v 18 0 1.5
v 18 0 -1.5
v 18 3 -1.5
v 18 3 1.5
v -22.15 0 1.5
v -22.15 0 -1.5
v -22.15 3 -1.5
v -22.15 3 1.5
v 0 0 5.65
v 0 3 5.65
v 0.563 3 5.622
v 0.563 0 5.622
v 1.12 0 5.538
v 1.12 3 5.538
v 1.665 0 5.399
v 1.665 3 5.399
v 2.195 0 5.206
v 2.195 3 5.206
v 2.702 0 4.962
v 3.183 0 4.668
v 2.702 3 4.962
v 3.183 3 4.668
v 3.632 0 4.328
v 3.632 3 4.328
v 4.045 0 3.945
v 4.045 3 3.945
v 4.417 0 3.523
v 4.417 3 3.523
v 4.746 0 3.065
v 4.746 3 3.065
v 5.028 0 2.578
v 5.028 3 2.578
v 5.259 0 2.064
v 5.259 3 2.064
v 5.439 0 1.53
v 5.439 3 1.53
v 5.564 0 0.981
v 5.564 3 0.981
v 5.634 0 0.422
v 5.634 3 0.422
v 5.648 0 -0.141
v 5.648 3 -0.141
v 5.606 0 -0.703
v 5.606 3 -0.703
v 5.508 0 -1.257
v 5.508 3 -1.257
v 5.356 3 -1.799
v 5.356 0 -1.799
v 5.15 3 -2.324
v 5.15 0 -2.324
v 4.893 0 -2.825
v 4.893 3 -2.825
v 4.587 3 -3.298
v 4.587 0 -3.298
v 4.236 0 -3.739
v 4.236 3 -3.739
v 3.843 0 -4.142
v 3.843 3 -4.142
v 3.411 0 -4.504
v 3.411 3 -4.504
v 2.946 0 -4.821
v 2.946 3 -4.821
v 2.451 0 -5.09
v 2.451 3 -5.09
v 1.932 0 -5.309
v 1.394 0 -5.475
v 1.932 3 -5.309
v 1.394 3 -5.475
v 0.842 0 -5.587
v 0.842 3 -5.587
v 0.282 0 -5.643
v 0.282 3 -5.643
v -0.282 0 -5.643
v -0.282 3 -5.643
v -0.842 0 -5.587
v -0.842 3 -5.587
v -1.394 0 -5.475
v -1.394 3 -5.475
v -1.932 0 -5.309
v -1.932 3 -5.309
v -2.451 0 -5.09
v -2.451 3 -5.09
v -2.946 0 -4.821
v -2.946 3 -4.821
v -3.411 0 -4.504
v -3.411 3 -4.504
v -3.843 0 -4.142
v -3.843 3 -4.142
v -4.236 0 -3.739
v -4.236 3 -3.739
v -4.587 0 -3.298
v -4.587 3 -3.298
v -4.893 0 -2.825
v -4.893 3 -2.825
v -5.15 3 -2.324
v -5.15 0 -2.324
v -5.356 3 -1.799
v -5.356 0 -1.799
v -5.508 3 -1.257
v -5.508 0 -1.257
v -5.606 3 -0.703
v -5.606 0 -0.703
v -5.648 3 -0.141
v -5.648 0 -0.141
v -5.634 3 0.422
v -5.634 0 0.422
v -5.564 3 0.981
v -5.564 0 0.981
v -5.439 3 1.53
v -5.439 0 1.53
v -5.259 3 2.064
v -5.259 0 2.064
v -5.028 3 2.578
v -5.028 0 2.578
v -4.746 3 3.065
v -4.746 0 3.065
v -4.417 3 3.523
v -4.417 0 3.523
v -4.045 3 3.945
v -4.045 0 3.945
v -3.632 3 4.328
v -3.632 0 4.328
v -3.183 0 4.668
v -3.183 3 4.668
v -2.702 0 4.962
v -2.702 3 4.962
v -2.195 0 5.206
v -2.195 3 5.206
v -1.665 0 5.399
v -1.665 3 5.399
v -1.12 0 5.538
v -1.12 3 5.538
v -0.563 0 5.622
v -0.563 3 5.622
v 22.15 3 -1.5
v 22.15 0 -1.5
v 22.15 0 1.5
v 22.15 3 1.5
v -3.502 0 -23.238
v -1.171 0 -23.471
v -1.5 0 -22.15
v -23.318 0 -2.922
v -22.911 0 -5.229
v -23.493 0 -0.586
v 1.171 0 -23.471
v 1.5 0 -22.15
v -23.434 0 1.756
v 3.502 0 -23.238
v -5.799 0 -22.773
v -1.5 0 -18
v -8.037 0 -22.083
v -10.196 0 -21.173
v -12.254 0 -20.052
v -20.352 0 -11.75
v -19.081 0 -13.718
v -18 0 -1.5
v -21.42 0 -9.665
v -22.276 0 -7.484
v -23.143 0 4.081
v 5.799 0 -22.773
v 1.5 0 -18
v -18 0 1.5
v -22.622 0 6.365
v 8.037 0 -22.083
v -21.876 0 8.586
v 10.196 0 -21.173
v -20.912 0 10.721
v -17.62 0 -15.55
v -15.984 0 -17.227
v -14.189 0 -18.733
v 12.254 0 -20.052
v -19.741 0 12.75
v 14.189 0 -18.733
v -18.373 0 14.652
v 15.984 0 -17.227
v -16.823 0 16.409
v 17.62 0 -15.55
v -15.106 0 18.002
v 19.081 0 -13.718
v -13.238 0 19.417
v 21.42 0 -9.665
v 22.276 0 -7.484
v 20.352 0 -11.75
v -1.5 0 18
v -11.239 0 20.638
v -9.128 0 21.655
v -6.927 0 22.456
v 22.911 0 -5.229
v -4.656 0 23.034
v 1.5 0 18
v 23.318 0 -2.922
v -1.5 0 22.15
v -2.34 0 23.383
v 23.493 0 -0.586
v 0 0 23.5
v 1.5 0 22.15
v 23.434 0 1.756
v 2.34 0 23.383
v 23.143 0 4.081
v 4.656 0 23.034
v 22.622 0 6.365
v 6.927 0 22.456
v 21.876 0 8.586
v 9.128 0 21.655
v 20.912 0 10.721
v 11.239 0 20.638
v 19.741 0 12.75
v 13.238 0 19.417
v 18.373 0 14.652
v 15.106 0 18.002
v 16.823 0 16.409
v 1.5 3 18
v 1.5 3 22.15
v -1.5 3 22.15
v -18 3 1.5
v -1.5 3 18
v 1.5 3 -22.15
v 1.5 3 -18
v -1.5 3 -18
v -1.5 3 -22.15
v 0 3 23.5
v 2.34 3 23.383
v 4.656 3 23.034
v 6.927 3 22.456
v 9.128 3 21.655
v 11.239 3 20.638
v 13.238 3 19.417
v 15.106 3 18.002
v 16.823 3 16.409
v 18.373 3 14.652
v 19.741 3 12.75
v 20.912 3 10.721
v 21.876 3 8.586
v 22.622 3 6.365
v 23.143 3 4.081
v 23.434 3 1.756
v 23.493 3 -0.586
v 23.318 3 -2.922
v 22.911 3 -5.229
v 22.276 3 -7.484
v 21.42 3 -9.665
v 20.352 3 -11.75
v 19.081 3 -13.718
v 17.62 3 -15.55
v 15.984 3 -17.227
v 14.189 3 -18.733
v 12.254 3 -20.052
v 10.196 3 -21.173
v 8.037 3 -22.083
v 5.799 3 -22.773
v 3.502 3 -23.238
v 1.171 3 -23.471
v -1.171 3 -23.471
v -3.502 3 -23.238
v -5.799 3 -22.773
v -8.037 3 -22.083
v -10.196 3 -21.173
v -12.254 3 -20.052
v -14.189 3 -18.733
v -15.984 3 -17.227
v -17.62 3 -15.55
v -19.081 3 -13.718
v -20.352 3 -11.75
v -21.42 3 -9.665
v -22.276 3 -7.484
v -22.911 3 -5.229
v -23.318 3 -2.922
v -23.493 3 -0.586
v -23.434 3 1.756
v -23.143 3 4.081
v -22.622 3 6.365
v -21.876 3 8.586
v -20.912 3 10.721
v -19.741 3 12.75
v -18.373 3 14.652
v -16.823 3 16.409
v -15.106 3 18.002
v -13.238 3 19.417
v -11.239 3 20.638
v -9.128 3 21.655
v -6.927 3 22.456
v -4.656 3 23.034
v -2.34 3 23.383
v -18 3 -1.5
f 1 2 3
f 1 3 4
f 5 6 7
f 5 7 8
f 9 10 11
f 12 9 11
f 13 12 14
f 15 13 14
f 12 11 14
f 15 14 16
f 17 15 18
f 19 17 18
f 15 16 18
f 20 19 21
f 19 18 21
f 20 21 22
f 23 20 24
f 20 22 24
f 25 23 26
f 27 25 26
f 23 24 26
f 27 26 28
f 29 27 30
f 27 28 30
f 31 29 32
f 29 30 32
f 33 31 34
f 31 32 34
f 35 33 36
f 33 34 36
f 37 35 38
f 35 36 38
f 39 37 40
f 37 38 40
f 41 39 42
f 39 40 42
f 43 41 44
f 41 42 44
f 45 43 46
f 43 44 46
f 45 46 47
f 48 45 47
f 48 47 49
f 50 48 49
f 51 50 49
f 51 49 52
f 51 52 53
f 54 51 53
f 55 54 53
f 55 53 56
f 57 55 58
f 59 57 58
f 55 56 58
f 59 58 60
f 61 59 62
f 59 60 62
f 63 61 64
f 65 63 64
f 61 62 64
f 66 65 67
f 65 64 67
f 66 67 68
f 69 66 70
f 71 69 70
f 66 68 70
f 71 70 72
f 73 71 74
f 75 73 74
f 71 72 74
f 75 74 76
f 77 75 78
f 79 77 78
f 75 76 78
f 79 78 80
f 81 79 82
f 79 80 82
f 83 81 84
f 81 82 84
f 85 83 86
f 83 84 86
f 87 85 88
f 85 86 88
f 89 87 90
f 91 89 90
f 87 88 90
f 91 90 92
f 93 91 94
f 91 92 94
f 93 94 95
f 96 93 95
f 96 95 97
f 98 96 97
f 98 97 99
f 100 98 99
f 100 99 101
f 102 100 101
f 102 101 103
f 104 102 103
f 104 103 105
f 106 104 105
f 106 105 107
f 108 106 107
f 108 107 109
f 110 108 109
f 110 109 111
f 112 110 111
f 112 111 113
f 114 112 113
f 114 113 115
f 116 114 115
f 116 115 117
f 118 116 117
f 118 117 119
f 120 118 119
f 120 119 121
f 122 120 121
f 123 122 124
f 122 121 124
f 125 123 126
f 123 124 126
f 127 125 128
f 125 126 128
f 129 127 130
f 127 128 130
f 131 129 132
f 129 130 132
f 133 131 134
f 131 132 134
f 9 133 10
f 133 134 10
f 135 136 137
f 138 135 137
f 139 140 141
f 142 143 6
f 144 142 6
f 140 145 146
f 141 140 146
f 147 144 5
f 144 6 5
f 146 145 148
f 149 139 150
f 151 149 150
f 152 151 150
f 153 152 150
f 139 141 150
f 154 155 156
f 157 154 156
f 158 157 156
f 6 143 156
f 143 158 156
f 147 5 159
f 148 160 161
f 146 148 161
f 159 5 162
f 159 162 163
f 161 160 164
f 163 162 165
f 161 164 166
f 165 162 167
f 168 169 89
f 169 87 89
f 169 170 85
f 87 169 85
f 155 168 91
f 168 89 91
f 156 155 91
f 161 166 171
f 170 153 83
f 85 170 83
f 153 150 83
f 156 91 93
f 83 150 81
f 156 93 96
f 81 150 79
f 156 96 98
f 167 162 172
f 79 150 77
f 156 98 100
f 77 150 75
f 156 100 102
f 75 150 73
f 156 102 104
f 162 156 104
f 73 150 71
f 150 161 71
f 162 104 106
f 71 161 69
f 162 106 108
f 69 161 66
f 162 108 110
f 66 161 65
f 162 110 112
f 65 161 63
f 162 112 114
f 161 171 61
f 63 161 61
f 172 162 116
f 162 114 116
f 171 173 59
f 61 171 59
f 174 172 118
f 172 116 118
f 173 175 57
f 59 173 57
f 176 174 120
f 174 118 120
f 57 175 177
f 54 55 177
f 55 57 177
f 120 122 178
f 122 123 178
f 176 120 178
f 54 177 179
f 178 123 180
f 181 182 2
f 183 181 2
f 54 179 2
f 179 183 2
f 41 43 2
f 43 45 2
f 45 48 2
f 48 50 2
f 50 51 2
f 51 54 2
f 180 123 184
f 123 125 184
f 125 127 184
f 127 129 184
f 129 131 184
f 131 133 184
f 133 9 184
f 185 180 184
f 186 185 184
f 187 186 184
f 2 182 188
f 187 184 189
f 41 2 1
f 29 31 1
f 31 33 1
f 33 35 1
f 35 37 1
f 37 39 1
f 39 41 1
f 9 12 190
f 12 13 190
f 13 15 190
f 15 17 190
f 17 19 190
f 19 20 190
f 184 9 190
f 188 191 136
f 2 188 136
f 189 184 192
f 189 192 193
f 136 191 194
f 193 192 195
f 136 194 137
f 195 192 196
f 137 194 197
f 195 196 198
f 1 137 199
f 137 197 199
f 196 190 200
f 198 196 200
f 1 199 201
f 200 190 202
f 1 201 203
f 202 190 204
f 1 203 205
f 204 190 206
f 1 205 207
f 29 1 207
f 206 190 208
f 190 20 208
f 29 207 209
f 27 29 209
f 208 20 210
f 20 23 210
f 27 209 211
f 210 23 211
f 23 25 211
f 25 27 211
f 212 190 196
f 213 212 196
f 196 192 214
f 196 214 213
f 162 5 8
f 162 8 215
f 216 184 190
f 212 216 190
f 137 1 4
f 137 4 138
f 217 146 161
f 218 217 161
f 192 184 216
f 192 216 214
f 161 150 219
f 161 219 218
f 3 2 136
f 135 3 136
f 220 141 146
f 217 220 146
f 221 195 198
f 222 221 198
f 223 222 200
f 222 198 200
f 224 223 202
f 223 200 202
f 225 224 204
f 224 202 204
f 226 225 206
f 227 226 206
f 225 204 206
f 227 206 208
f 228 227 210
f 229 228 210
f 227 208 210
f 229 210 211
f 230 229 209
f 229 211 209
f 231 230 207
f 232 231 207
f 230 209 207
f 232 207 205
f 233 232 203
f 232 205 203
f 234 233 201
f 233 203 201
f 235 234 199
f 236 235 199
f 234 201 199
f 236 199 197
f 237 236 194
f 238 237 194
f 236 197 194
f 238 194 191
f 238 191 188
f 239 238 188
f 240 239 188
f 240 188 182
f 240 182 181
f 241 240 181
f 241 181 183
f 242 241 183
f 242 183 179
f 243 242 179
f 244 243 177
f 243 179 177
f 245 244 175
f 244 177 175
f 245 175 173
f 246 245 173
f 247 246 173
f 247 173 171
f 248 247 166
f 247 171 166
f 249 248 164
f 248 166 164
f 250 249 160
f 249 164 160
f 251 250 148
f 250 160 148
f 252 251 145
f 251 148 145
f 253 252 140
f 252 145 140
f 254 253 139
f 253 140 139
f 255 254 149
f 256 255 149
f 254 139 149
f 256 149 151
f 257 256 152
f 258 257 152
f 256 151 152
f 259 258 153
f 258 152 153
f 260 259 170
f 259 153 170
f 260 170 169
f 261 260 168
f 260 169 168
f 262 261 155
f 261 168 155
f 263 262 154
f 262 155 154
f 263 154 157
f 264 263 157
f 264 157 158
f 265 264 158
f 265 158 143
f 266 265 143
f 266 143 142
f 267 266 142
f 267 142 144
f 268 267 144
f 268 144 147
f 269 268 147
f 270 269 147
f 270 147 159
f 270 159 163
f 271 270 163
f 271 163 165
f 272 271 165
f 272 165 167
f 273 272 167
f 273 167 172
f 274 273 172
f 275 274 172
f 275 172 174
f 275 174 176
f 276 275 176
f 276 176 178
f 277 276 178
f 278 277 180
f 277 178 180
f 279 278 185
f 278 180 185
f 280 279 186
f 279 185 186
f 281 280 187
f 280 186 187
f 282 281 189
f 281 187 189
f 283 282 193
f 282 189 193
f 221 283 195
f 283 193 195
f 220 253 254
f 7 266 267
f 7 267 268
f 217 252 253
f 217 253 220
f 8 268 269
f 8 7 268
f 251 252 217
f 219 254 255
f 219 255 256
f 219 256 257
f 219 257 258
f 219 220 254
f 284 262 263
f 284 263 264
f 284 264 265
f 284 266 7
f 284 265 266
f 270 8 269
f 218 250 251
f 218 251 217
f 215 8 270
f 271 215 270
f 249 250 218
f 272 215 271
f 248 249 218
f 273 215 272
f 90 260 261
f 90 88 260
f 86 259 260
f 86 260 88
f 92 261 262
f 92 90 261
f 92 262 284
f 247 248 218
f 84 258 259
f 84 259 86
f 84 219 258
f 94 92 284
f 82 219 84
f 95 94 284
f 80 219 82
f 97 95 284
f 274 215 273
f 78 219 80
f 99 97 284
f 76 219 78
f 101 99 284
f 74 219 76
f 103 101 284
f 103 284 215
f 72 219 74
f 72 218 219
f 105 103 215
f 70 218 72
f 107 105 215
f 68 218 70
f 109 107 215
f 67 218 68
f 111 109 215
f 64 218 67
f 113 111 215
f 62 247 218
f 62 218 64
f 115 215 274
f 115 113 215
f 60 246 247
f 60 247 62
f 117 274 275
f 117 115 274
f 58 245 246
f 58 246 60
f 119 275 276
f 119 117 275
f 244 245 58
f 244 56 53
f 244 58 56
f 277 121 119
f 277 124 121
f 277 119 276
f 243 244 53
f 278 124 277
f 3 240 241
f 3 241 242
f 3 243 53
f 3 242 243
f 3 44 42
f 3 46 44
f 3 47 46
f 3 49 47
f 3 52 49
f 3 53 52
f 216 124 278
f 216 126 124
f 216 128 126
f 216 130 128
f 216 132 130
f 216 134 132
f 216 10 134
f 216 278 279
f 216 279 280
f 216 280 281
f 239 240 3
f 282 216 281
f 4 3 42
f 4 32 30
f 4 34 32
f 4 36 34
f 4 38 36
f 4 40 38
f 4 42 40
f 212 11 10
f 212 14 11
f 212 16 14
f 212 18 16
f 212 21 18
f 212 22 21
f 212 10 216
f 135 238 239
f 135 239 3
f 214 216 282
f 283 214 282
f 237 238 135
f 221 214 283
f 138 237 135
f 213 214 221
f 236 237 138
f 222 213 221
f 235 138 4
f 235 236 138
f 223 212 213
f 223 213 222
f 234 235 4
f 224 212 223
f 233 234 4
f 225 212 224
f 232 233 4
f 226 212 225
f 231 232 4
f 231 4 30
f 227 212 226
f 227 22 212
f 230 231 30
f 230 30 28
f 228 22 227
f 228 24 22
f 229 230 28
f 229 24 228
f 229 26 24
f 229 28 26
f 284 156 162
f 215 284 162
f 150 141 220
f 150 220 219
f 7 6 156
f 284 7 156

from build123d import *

# Parameters (mm, degrees)
SKICA1_R                 = 23.5
P_IDAT_VYSUNUT_M1_DEPTH  = 3
SKICA2_R                 = 5.65
ODEBRAT_VYSUNUT_M1_DEPTH = 3
SKICA3_W                 = 4.15
SKICA3_H                 = 3
SKICA3_W_2               = 3
SKICA3_H_2               = 4.15
ODEBRAT_VYSUNUT_M2_DEPTH = 3


with BuildPart() as part:
    # Skica1 → Přidat vysunutím1 (new body)
    with BuildSketch(Plane(origin=(0, 0, 0), x_dir=(1, 0, 0), z_dir=(0, 1, 0))):
        with Locations(Location((0, 0, 0), (0, 0, 270))):
            Circle(SKICA1_R)
    extrude(amount=P_IDAT_VYSUNUT_M1_DEPTH)

    # Skica2 → Odebrat vysunutím1 (cut)
    with BuildSketch(Plane(origin=(0, 3, 0), x_dir=(1, 0, 0), z_dir=(0, 1, 0))):
        with Locations(Location((0, 0, 0), (0, 0, 270))):
            Circle(SKICA2_R)
    extrude(amount=-ODEBRAT_VYSUNUT_M1_DEPTH, mode=Mode.SUBTRACT)

    # Skica3 → Odebrat vysunutím2 (cut)
    with BuildSketch(Plane.XZ):
        with Locations((20.075, 0)):
            Rectangle(SKICA3_W, SKICA3_H)
        with Locations((0, 20.075)):
            Rectangle(SKICA3_W_2, SKICA3_H_2)
        with Locations((0, -20.075)):
            Rectangle(SKICA3_W_2, SKICA3_H_2)
        with Locations((-20.075, 0)):
            Rectangle(SKICA3_W, SKICA3_H)
    extrude(amount=-ODEBRAT_VYSUNUT_M2_DEPTH, mode=Mode.SUBTRACT)


solid = part.part
